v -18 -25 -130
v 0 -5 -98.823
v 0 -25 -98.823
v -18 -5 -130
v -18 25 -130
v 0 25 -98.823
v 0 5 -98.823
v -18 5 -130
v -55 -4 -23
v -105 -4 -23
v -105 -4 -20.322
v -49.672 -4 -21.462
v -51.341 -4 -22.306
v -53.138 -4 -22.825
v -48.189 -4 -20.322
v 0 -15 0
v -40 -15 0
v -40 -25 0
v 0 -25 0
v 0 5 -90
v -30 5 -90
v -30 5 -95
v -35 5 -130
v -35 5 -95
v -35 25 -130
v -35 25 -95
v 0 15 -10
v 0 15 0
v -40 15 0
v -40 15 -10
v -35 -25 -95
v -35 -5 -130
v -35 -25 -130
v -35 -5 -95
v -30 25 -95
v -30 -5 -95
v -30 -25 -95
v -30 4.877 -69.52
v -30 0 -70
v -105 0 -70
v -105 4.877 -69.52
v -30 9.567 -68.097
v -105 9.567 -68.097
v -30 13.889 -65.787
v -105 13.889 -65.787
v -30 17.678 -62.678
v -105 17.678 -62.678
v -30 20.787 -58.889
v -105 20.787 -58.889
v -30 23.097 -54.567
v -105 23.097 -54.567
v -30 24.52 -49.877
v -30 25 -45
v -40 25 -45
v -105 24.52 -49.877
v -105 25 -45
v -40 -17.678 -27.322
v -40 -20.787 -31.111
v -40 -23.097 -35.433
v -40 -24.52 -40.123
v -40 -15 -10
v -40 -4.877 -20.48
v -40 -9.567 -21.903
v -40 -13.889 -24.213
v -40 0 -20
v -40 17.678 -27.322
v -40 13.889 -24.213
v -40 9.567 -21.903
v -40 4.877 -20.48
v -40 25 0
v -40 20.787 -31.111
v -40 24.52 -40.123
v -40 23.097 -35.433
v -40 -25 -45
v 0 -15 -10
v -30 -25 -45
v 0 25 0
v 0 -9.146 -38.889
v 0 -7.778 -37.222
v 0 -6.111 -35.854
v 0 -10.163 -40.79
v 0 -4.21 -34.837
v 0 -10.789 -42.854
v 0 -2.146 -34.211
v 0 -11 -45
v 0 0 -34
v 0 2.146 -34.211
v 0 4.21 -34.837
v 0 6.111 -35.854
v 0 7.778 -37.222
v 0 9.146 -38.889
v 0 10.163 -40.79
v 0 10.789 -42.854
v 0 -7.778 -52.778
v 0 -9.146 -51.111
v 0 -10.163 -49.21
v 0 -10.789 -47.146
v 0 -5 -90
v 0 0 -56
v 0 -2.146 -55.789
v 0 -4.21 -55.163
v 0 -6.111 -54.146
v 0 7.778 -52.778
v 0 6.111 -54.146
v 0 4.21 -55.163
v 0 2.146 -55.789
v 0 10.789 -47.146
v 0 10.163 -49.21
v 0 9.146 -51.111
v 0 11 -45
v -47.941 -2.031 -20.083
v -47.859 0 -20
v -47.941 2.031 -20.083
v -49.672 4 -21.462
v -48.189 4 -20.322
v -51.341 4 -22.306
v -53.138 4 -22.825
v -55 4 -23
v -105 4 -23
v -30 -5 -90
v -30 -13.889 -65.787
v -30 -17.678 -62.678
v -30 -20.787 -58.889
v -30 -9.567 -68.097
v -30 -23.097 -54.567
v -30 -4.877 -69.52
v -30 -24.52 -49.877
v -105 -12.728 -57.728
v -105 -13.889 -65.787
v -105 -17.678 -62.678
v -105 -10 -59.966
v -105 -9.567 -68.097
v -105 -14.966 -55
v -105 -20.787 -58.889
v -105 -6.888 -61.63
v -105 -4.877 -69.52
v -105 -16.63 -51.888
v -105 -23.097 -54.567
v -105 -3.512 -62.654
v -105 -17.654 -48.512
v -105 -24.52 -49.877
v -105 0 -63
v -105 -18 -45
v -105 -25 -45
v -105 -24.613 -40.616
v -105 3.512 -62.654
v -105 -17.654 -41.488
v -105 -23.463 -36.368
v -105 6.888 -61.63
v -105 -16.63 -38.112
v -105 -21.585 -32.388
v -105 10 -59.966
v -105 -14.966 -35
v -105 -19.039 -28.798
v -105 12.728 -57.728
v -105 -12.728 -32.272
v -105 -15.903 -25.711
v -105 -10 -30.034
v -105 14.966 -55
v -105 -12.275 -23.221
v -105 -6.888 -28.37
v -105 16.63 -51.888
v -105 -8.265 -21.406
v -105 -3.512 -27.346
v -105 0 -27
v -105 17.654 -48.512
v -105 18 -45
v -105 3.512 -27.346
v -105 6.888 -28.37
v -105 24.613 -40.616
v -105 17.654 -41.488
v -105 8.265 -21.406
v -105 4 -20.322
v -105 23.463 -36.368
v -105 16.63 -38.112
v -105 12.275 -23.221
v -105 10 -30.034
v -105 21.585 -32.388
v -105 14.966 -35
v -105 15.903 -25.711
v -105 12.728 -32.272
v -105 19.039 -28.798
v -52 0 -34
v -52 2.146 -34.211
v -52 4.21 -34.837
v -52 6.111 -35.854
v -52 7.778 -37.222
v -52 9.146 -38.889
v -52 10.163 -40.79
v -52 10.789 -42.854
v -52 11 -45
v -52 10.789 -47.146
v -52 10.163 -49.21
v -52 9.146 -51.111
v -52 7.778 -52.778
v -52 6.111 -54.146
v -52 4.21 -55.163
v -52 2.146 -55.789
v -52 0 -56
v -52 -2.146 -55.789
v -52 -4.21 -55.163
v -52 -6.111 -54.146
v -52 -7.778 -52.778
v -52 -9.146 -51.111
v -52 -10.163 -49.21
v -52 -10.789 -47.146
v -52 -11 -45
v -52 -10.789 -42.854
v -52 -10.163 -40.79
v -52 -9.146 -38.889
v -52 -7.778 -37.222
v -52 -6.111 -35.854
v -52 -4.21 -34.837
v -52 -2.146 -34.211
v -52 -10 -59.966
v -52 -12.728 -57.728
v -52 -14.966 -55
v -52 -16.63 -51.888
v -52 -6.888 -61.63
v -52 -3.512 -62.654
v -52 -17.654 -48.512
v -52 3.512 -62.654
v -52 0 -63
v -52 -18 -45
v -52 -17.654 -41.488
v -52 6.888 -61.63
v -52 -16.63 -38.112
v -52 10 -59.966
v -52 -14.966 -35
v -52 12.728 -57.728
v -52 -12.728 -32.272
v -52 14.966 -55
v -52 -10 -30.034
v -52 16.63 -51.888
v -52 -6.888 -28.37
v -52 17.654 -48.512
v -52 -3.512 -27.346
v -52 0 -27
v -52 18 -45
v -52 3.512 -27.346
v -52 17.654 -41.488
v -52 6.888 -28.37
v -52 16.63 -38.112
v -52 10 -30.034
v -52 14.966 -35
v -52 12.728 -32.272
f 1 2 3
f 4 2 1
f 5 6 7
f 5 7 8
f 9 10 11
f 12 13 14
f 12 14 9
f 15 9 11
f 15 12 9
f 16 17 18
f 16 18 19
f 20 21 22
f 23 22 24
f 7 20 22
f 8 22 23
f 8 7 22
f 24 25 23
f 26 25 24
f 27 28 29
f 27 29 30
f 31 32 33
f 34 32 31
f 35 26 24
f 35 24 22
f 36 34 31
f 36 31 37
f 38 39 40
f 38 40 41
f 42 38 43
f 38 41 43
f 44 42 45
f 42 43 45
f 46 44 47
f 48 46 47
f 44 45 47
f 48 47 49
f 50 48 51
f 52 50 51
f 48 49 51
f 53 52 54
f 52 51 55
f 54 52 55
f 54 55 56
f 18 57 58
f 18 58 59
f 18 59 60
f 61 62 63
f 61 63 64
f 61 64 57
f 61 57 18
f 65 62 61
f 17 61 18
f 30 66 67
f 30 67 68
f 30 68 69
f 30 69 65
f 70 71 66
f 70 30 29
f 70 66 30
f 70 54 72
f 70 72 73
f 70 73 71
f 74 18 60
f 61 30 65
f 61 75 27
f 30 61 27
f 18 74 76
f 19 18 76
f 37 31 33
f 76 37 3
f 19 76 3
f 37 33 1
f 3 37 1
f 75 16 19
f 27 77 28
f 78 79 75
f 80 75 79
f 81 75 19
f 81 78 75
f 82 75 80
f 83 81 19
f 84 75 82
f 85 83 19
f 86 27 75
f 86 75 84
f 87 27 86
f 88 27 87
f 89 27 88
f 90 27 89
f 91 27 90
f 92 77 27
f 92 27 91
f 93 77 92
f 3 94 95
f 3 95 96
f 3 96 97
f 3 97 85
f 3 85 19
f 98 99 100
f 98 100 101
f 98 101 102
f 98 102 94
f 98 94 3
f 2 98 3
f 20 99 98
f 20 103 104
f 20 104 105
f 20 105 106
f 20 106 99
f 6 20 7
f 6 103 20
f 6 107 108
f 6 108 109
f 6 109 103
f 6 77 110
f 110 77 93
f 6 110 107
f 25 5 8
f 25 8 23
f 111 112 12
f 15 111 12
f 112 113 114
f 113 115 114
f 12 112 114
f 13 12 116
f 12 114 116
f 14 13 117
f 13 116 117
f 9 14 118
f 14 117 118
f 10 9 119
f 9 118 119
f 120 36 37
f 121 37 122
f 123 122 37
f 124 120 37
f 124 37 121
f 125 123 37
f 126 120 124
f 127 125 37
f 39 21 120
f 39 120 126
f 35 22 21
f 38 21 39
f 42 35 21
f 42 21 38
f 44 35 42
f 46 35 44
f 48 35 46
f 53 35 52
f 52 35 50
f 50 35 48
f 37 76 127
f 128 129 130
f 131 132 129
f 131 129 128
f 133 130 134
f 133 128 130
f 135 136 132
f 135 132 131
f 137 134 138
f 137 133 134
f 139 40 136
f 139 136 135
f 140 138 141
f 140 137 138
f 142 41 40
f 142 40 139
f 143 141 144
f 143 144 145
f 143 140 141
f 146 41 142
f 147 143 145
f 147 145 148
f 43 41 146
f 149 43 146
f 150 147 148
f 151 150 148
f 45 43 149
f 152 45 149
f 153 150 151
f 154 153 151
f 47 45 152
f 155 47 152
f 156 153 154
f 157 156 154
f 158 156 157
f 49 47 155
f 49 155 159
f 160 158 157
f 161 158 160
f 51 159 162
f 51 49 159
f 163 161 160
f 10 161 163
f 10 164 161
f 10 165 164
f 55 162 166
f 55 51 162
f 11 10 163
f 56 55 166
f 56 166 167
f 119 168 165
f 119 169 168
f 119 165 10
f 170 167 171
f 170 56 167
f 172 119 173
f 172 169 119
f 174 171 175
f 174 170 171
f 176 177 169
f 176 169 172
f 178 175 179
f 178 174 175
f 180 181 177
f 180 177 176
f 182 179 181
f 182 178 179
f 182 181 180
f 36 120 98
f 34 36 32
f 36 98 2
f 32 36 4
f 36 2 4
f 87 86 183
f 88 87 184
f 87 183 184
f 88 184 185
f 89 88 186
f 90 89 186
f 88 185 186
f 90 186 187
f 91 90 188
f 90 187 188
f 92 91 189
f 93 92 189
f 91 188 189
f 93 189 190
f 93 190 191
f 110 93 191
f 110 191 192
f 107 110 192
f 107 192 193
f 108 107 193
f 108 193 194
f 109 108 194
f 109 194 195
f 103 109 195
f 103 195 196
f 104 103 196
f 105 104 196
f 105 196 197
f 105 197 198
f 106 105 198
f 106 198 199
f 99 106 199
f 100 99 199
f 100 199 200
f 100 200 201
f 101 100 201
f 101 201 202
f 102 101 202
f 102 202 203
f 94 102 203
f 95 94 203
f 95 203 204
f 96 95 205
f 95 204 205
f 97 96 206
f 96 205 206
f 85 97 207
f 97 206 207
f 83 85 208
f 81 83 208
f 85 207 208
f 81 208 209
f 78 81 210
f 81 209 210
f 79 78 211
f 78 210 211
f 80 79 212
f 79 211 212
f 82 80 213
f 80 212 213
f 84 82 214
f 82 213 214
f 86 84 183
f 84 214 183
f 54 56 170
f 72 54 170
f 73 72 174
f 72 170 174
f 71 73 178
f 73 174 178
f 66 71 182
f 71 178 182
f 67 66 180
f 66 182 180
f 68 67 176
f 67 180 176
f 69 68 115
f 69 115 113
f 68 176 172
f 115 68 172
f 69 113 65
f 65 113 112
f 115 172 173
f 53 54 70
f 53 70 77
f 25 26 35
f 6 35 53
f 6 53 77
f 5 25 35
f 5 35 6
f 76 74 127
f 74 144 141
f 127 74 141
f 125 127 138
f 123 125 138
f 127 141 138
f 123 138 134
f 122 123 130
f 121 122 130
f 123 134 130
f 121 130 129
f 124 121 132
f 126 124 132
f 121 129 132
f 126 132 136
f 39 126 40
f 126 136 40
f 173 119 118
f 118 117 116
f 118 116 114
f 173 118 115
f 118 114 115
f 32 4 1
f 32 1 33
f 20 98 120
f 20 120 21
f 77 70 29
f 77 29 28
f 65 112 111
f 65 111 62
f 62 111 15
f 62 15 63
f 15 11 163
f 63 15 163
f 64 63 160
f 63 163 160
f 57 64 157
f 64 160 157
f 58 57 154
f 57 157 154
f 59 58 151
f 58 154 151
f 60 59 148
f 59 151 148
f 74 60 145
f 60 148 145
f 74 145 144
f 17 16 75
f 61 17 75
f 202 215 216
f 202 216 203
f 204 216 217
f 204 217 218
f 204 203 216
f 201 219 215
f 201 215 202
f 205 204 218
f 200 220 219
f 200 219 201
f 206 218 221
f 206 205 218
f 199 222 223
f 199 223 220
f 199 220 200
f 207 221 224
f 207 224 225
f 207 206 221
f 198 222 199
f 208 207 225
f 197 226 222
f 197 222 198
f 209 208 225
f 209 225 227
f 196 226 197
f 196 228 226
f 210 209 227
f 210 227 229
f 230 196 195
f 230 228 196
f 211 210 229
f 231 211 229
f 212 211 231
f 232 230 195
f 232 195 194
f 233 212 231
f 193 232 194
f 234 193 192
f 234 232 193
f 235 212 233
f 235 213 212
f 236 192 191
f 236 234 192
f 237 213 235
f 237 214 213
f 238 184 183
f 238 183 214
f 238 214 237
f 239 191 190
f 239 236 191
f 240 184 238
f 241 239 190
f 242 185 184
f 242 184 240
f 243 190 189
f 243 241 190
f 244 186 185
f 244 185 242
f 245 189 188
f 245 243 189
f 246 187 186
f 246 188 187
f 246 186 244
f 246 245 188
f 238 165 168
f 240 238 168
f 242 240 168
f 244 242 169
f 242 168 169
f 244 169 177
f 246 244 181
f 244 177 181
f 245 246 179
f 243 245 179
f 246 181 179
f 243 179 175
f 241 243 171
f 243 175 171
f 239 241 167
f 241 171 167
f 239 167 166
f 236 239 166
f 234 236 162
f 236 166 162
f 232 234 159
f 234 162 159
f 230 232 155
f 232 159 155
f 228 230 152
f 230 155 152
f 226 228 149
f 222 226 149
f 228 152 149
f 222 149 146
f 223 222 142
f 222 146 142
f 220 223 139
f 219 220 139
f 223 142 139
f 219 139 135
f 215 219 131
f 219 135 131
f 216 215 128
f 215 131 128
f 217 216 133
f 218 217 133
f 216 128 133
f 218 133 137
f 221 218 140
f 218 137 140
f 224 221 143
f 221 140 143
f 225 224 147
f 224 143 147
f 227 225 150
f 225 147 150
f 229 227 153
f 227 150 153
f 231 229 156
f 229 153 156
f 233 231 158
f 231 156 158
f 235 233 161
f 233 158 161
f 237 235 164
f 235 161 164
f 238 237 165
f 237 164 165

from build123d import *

# Parameters (mm, degrees)
EXTRUDE_1_DEPTH     = 25
CUT_EXTRUDE_1_REACH = 170.967
SKETCH_3_W          = 40
SKETCH_3_H          = 10
SKETCH_3_W_2        = 10
SKETCH_3_H_2        = 30
CUT_EXTRUDE_2_DEPTH = 75
CUT_EXTRUDE_3_DEPTH = 65
CUT_EXTRUDE_4_DEPTH = 4
SKETCH_8_R          = 18
CUT_EXTRUDE_5_DEPTH = 53
CUT_EXTRUDE_6_REACH = 144.597
SKETCH_9_R          = 11


with BuildPart() as part:
    # Эскиз1 → Бобышка-Вытянуть1 (new, symmetric)
    with BuildSketch(Plane(origin=(0, 0, 0), x_dir=(1, 0, 0), z_dir=(0, 1, 0))):
        Polygon((0, 0), (0, 98.823085464), (-18, 130), (-35, 130), (-35, 95), (-30, 95), (-30, 89.524477305), (-30, 70), (-105, 70), (-105, 20), (-40, 20), (-40, 0), align=None)
    extrude(amount=EXTRUDE_1_DEPTH, both=True)

    # Эскиз3 → Вырез-Вытянуть1 (cut, up to next)
    with BuildSketch(Plane(origin=(0, 0, 0), x_dir=(0, 0, -1), z_dir=(1, 0, 0)), mode=Mode.PRIVATE) as cut_extrude_1_sk1:
        with Locations((110, 0)):
            Rectangle(SKETCH_3_W, SKETCH_3_H)
    cut_extrude_1_tool1 = extrude(cut_extrude_1_sk1.sketch, amount=-CUT_EXTRUDE_1_REACH, mode=Mode.PRIVATE) & part.part
    # Эскиз3 → Вырез-Вытянуть1 (cut, up to next)
    with BuildSketch(Plane(origin=(0, 0, 0), x_dir=(0, 0, -1), z_dir=(1, 0, 0)), mode=Mode.PRIVATE) as cut_extrude_1_sk2:
        with Locations((5, 0)):
            Rectangle(SKETCH_3_W_2, SKETCH_3_H_2)
    cut_extrude_1_tool2 = extrude(cut_extrude_1_sk2.sketch, amount=-CUT_EXTRUDE_1_REACH, mode=Mode.PRIVATE) & part.part
    add(cut_extrude_1_tool1.solids().sort_by_distance((0, 0, -110))[0], mode=Mode.SUBTRACT)
    add(cut_extrude_1_tool2.solids().sort_by_distance((0, 0, -5))[0], mode=Mode.SUBTRACT)

    # Эскиз4 → Вырез-Вытянуть2 (cut)
    with BuildSketch(Plane.ZY.offset(105)):
        with BuildLine():
            Line((-70, -25), (-45, -25))
            ThreePointArc((-45, -25), (-62.677669515, -17.677669545), (-70, -4.2e-08))
            Line((-70, -4.2e-08), (-70, -25))
        make_face()
        with BuildLine():
            Line((-70, 25), (-70, -4.2e-08))
            ThreePointArc((-70, -4.2e-08), (-62.677669545, 17.677669515), (-45, 25))
            Line((-45, 25), (-70, 25))
        make_face()
    extrude(amount=-CUT_EXTRUDE_2_DEPTH, mode=Mode.SUBTRACT)

    # Эскиз6 → Вырез-Вытянуть3 (cut)
    with BuildSketch(Plane.ZY.offset(105)):
        with BuildLine():
            ThreePointArc((-20, 0), (-27.32233047, -17.67766953), (-45, -25))
            Line((-45, -25), (-20, -25))
            Line((-20, -25), (-20, 0))
        make_face()
        with BuildLine():
            ThreePointArc((-45, 25), (-27.32233047, 17.67766953), (-20, 0))
            Line((-20, 0), (-20, 25))
            Line((-20, 25), (-45, 25))
        make_face()
    extrude(amount=-CUT_EXTRUDE_3_DEPTH, mode=Mode.SUBTRACT)

    # Эскиз7 → Вырез-Вытянуть4 (cut, symmetric)
    with BuildSketch(Plane(origin=(0, 0, 0), x_dir=(1, 0, 0), z_dir=(0, 1, 0))):
        with BuildLine():
            Line((-105, 23), (-105, 20))
            Line((-105, 20), (-62.141428429, 20))
            ThreePointArc((-62.141428429, 20), (-58.872983346, 22.219544457), (-55, 23))
            Line((-55, 23), (-105, 23))
        make_face()
        with BuildLine():
            ThreePointArc((-55, 23), (-58.872983346, 22.219544457), (-62.141428429, 20))
            Line((-62.141428429, 20), (-55, 20))
            Line((-55, 20), (-55, 23))
        make_face()
        with BuildLine():
            ThreePointArc((-47.858571571, 20), (-51.127016654, 22.219544457), (-55, 23))
            Line((-55, 23), (-55, 20))
            Line((-55, 20), (-47.858571571, 20))
        make_face()
    extrude(amount=CUT_EXTRUDE_4_DEPTH, both=True, mode=Mode.SUBTRACT)

    # Эскиз8 → Вырез-Вытянуть5 (cut)
    with BuildSketch(Plane.ZY.offset(105)):
        with Locations((-45, 0)):
            Circle(SKETCH_8_R)
    extrude(amount=-CUT_EXTRUDE_5_DEPTH, mode=Mode.SUBTRACT)

    # Эскиз9 → Вырез-Вытянуть6 (cut, up to next)
    with BuildSketch(Plane.ZY.offset(52), mode=Mode.PRIVATE) as cut_extrude_6_sk1:
        with Locations((-45, 0)):
            Circle(SKETCH_9_R)
    cut_extrude_6_tool1 = extrude(cut_extrude_6_sk1.sketch, amount=-CUT_EXTRUDE_6_REACH, mode=Mode.PRIVATE) & part.part
    add(cut_extrude_6_tool1.solids().sort_by_distance((-52, 0, -45))[0], mode=Mode.SUBTRACT)


solid = part.part
